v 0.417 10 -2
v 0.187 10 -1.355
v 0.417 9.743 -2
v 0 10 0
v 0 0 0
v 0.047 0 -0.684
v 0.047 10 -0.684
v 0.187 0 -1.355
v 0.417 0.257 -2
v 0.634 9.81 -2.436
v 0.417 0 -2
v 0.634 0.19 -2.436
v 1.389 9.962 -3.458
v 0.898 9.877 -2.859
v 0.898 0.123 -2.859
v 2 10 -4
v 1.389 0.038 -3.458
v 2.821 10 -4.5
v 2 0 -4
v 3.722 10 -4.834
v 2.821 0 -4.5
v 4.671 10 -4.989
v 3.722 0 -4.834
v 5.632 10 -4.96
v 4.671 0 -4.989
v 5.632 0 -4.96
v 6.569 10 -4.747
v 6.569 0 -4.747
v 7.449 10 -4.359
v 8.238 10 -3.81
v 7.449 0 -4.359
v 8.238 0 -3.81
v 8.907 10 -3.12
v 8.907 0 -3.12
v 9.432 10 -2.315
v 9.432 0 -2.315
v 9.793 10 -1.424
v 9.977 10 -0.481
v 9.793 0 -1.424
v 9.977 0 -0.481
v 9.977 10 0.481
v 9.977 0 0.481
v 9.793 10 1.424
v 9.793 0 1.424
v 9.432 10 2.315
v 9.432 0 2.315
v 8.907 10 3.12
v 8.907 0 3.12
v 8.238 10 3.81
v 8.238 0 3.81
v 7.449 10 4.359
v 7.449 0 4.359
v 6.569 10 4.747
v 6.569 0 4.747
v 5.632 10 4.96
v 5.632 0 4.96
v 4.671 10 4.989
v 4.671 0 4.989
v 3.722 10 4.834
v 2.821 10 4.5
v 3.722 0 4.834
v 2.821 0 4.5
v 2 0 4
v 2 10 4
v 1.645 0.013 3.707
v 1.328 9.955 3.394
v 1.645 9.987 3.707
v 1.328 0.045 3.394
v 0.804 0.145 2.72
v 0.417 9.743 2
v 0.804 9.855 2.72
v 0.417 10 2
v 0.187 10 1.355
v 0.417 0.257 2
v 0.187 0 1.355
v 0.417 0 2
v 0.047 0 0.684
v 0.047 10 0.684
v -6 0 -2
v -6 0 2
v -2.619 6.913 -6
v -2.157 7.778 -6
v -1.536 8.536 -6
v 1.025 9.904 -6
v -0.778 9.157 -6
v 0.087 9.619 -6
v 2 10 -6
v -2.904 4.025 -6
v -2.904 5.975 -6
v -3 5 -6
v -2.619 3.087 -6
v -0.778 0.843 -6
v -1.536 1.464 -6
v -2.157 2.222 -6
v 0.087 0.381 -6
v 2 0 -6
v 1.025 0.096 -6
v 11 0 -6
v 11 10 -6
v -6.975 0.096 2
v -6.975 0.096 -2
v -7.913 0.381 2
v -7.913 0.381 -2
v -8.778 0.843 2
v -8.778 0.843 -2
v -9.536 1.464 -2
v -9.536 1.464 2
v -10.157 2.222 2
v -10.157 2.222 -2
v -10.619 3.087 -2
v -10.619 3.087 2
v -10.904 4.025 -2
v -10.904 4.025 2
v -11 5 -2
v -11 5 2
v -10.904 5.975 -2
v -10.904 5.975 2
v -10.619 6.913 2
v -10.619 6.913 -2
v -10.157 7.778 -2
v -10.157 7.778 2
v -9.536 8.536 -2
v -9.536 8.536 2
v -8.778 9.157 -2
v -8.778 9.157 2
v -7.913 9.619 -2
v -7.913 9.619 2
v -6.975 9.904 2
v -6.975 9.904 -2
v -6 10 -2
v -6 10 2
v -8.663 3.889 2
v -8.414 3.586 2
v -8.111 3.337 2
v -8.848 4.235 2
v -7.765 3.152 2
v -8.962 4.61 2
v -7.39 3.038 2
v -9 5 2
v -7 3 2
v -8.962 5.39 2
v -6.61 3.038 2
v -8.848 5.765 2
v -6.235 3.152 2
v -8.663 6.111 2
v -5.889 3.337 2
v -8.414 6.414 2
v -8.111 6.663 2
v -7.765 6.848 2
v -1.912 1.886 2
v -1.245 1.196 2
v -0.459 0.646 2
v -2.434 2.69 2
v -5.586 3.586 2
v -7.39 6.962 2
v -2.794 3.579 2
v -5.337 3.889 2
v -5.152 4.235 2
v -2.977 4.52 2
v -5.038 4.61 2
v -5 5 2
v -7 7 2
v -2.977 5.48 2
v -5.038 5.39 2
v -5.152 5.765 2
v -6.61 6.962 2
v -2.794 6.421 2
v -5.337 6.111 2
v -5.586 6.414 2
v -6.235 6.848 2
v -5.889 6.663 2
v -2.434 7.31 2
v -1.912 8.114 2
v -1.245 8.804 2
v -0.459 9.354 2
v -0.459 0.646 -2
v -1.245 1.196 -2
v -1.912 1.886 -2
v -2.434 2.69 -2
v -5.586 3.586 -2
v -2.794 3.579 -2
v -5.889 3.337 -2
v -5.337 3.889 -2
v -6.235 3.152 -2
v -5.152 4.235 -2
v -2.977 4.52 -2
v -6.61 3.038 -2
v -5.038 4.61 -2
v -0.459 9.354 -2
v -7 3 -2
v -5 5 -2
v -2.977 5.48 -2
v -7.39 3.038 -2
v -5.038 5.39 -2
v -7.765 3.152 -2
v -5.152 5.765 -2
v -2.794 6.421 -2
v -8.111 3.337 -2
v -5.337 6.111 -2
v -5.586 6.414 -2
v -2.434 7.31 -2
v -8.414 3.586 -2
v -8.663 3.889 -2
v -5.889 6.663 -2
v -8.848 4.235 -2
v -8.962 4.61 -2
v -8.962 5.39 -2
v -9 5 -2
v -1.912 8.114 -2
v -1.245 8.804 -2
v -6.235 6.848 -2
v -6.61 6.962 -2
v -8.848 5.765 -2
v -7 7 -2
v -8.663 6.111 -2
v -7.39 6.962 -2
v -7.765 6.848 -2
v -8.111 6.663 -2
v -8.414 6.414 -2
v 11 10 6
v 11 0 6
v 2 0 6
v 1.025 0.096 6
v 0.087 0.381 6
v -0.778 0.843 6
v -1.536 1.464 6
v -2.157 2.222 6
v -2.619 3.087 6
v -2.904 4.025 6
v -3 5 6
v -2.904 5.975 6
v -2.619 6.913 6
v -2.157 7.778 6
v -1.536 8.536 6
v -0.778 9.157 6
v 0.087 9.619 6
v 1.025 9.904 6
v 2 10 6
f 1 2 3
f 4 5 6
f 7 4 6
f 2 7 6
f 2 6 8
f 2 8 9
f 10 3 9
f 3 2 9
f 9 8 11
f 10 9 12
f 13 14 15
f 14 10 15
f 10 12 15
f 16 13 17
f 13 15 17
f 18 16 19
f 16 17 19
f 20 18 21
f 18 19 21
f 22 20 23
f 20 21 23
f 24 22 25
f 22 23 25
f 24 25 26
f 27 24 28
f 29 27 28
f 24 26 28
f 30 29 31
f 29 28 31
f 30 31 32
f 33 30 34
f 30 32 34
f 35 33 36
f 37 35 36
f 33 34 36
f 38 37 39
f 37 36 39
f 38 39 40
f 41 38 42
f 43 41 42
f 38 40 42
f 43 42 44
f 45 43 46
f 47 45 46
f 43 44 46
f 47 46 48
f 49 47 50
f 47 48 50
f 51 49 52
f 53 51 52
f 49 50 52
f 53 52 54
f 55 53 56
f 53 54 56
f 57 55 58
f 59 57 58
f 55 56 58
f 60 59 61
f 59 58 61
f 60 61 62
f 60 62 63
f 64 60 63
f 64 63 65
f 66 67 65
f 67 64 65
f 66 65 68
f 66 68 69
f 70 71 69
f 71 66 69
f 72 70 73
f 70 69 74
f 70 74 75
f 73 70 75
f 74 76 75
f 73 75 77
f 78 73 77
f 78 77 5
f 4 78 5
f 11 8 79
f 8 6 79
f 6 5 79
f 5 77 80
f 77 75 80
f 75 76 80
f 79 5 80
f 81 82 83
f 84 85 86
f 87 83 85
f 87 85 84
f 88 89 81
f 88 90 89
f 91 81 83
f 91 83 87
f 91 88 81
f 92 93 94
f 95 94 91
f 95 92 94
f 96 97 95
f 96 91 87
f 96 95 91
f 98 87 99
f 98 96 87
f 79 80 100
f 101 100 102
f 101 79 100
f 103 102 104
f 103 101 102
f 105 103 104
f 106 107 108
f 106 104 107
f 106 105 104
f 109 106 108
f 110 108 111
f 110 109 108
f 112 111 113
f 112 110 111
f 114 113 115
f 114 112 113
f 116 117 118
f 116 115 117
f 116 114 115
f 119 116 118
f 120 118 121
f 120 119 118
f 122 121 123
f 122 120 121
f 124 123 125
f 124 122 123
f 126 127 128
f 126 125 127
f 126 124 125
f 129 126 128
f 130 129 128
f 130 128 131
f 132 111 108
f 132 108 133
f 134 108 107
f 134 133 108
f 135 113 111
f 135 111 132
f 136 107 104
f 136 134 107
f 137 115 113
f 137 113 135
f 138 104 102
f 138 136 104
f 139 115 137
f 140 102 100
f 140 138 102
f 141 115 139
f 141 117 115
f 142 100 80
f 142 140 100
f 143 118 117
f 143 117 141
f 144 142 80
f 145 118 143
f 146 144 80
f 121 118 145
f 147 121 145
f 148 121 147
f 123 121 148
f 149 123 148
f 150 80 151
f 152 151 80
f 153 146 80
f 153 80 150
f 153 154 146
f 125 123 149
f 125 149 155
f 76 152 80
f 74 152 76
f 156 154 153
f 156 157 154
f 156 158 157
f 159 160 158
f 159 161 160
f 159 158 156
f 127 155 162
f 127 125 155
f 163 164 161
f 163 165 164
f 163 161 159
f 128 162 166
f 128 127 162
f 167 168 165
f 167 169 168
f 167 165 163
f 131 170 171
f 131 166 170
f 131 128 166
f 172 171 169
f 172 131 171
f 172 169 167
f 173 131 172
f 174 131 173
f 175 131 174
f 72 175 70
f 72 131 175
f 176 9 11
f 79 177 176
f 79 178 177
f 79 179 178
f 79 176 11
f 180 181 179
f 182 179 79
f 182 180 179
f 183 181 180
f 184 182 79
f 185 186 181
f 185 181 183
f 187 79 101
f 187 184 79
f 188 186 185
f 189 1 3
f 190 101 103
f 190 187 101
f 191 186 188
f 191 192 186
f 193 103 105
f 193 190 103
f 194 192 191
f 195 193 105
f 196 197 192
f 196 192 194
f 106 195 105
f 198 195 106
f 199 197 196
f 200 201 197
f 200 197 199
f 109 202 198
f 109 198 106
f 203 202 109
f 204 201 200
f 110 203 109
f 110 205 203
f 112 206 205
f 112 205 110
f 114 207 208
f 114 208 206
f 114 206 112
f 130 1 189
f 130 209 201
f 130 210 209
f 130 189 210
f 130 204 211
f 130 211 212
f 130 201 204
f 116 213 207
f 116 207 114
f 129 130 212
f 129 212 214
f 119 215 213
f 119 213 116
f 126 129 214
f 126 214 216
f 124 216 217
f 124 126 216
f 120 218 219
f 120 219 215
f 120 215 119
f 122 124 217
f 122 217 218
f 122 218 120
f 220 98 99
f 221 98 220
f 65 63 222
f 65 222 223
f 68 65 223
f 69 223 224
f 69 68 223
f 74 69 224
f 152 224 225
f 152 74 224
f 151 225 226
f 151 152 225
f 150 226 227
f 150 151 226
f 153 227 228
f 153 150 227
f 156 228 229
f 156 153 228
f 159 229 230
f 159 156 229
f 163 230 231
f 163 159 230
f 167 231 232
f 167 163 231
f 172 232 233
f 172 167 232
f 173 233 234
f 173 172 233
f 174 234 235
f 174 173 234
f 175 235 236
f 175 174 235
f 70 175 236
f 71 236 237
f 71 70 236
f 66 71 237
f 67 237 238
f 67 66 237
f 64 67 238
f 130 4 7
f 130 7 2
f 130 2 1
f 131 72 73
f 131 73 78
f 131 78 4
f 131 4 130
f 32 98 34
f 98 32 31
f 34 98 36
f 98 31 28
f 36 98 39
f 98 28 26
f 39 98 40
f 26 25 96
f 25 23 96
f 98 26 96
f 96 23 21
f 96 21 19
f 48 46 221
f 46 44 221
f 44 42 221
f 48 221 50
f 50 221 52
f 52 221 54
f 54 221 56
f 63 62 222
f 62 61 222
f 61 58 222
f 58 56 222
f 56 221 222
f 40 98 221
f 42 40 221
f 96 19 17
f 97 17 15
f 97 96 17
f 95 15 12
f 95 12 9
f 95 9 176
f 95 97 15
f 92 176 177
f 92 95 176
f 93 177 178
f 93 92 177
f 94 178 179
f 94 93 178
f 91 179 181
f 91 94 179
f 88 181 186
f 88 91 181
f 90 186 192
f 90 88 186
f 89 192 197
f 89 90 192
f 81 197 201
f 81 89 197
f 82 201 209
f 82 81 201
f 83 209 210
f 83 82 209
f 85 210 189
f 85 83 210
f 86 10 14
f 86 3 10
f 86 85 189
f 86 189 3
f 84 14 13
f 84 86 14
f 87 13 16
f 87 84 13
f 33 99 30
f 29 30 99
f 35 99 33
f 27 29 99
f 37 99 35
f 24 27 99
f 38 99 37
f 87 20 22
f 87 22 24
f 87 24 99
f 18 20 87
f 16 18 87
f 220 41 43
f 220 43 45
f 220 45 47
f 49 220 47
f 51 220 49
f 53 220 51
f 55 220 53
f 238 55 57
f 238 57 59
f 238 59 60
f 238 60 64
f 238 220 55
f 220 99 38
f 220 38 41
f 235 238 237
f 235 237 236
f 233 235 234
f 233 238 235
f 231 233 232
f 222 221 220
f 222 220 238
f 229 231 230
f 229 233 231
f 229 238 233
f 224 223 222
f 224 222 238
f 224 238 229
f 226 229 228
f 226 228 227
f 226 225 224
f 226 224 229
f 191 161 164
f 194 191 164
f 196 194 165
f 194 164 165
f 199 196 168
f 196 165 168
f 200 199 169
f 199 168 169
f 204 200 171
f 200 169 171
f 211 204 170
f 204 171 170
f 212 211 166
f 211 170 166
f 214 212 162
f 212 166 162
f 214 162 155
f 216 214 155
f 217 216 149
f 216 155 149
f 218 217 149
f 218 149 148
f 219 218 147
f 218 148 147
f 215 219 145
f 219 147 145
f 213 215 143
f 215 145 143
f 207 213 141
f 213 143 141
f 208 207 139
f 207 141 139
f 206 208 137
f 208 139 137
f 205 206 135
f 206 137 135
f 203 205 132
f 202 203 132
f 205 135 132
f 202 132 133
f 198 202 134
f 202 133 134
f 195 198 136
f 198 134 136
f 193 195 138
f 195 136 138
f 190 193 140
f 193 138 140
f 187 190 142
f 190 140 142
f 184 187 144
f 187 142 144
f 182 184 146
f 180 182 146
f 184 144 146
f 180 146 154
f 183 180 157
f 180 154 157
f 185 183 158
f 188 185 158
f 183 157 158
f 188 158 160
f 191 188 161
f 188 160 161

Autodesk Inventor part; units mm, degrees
ref_plane "YZ Plane" through (0, 0, 0) normal (1, 0, 0) x (0, 1, 0)
ref_plane "XZ Plane" through (0, 0, 0) normal (0, 1, 0) x (-1, 0, 0)
ref_plane "XY Plane" through (0, 0, 0) normal (0, 0, 1) x (1, 0, 0)
sketch "Szkic2" plane through (0, 0, 0) normal (0, 1, 0) x (-1, 0, 0)
  line L0 (-11, 6) -> (11, 6)
  line L1 (11, 6) -> (11, -6)
  line L2 (11, -6) -> (-11, -6)
  line L3 (-11, -6) -> (-11, 6)
  line L4 (-11, 6) -> (11, -6) construction
  line L5 (11, 6) -> (-11, -6) construction
  line L6 (-11, 0) -> (-5, 0)
  circle A0 centre (-5, 0) radius 5
  line L7 (11, 0) -> (11, 2)
  line L8 (11, 2) -> (3, 2)
  line L9 (3, 2) -> (3, 6)
  line L10 (11, -6) -> (11, 6)
  line L11 (11, -2) -> (3, -2)
  line L12 (3, -2) -> (3, -6)
  point P0 (0, 0)
  point P1 (3, -6)
  point P2 (11, -2)
  dimension "d11" = 22
  dimension "d12" = 12
  dimension "d13" = 6
  dimension "d14" = 10
  dimension "d15" = 2
  dimension "d16" = 8
extrude "Wyciągnięcie proste3" add sketch "Szkic2" along normal blind 10 contours L0 L9 L8 L1 L11 L12 L2 L3
sketch "Szkic3" plane through (-11, 0, 2) normal (0, 0, 1) x (1, 0, 0)
  line L0 (0, 0) -> (0, 10) projected
  line L1 (8, 0) -> (0, 0) projected
  line L2 (0, 10) -> (0, 0)
  line L3 (8, 0) -> (8, 10) projected
  circle A0 centre (4, 5) radius 2
  point P0 (11, 0)
  dimension "d19" = 4
  dimension "d23" = 4
extrude "Wyciągnięcie proste4" cut sketch "Szkic3" against normal blind 32.75
fillet "Zaokrąglenie1" radius 5 6 edges at (-11, 0, 0) (-11, 10, 0) (-3, 0, 4) (-3, 10, 4) (-3, 0, -4) (-3, 10, -4)
properties part number "Knee"
